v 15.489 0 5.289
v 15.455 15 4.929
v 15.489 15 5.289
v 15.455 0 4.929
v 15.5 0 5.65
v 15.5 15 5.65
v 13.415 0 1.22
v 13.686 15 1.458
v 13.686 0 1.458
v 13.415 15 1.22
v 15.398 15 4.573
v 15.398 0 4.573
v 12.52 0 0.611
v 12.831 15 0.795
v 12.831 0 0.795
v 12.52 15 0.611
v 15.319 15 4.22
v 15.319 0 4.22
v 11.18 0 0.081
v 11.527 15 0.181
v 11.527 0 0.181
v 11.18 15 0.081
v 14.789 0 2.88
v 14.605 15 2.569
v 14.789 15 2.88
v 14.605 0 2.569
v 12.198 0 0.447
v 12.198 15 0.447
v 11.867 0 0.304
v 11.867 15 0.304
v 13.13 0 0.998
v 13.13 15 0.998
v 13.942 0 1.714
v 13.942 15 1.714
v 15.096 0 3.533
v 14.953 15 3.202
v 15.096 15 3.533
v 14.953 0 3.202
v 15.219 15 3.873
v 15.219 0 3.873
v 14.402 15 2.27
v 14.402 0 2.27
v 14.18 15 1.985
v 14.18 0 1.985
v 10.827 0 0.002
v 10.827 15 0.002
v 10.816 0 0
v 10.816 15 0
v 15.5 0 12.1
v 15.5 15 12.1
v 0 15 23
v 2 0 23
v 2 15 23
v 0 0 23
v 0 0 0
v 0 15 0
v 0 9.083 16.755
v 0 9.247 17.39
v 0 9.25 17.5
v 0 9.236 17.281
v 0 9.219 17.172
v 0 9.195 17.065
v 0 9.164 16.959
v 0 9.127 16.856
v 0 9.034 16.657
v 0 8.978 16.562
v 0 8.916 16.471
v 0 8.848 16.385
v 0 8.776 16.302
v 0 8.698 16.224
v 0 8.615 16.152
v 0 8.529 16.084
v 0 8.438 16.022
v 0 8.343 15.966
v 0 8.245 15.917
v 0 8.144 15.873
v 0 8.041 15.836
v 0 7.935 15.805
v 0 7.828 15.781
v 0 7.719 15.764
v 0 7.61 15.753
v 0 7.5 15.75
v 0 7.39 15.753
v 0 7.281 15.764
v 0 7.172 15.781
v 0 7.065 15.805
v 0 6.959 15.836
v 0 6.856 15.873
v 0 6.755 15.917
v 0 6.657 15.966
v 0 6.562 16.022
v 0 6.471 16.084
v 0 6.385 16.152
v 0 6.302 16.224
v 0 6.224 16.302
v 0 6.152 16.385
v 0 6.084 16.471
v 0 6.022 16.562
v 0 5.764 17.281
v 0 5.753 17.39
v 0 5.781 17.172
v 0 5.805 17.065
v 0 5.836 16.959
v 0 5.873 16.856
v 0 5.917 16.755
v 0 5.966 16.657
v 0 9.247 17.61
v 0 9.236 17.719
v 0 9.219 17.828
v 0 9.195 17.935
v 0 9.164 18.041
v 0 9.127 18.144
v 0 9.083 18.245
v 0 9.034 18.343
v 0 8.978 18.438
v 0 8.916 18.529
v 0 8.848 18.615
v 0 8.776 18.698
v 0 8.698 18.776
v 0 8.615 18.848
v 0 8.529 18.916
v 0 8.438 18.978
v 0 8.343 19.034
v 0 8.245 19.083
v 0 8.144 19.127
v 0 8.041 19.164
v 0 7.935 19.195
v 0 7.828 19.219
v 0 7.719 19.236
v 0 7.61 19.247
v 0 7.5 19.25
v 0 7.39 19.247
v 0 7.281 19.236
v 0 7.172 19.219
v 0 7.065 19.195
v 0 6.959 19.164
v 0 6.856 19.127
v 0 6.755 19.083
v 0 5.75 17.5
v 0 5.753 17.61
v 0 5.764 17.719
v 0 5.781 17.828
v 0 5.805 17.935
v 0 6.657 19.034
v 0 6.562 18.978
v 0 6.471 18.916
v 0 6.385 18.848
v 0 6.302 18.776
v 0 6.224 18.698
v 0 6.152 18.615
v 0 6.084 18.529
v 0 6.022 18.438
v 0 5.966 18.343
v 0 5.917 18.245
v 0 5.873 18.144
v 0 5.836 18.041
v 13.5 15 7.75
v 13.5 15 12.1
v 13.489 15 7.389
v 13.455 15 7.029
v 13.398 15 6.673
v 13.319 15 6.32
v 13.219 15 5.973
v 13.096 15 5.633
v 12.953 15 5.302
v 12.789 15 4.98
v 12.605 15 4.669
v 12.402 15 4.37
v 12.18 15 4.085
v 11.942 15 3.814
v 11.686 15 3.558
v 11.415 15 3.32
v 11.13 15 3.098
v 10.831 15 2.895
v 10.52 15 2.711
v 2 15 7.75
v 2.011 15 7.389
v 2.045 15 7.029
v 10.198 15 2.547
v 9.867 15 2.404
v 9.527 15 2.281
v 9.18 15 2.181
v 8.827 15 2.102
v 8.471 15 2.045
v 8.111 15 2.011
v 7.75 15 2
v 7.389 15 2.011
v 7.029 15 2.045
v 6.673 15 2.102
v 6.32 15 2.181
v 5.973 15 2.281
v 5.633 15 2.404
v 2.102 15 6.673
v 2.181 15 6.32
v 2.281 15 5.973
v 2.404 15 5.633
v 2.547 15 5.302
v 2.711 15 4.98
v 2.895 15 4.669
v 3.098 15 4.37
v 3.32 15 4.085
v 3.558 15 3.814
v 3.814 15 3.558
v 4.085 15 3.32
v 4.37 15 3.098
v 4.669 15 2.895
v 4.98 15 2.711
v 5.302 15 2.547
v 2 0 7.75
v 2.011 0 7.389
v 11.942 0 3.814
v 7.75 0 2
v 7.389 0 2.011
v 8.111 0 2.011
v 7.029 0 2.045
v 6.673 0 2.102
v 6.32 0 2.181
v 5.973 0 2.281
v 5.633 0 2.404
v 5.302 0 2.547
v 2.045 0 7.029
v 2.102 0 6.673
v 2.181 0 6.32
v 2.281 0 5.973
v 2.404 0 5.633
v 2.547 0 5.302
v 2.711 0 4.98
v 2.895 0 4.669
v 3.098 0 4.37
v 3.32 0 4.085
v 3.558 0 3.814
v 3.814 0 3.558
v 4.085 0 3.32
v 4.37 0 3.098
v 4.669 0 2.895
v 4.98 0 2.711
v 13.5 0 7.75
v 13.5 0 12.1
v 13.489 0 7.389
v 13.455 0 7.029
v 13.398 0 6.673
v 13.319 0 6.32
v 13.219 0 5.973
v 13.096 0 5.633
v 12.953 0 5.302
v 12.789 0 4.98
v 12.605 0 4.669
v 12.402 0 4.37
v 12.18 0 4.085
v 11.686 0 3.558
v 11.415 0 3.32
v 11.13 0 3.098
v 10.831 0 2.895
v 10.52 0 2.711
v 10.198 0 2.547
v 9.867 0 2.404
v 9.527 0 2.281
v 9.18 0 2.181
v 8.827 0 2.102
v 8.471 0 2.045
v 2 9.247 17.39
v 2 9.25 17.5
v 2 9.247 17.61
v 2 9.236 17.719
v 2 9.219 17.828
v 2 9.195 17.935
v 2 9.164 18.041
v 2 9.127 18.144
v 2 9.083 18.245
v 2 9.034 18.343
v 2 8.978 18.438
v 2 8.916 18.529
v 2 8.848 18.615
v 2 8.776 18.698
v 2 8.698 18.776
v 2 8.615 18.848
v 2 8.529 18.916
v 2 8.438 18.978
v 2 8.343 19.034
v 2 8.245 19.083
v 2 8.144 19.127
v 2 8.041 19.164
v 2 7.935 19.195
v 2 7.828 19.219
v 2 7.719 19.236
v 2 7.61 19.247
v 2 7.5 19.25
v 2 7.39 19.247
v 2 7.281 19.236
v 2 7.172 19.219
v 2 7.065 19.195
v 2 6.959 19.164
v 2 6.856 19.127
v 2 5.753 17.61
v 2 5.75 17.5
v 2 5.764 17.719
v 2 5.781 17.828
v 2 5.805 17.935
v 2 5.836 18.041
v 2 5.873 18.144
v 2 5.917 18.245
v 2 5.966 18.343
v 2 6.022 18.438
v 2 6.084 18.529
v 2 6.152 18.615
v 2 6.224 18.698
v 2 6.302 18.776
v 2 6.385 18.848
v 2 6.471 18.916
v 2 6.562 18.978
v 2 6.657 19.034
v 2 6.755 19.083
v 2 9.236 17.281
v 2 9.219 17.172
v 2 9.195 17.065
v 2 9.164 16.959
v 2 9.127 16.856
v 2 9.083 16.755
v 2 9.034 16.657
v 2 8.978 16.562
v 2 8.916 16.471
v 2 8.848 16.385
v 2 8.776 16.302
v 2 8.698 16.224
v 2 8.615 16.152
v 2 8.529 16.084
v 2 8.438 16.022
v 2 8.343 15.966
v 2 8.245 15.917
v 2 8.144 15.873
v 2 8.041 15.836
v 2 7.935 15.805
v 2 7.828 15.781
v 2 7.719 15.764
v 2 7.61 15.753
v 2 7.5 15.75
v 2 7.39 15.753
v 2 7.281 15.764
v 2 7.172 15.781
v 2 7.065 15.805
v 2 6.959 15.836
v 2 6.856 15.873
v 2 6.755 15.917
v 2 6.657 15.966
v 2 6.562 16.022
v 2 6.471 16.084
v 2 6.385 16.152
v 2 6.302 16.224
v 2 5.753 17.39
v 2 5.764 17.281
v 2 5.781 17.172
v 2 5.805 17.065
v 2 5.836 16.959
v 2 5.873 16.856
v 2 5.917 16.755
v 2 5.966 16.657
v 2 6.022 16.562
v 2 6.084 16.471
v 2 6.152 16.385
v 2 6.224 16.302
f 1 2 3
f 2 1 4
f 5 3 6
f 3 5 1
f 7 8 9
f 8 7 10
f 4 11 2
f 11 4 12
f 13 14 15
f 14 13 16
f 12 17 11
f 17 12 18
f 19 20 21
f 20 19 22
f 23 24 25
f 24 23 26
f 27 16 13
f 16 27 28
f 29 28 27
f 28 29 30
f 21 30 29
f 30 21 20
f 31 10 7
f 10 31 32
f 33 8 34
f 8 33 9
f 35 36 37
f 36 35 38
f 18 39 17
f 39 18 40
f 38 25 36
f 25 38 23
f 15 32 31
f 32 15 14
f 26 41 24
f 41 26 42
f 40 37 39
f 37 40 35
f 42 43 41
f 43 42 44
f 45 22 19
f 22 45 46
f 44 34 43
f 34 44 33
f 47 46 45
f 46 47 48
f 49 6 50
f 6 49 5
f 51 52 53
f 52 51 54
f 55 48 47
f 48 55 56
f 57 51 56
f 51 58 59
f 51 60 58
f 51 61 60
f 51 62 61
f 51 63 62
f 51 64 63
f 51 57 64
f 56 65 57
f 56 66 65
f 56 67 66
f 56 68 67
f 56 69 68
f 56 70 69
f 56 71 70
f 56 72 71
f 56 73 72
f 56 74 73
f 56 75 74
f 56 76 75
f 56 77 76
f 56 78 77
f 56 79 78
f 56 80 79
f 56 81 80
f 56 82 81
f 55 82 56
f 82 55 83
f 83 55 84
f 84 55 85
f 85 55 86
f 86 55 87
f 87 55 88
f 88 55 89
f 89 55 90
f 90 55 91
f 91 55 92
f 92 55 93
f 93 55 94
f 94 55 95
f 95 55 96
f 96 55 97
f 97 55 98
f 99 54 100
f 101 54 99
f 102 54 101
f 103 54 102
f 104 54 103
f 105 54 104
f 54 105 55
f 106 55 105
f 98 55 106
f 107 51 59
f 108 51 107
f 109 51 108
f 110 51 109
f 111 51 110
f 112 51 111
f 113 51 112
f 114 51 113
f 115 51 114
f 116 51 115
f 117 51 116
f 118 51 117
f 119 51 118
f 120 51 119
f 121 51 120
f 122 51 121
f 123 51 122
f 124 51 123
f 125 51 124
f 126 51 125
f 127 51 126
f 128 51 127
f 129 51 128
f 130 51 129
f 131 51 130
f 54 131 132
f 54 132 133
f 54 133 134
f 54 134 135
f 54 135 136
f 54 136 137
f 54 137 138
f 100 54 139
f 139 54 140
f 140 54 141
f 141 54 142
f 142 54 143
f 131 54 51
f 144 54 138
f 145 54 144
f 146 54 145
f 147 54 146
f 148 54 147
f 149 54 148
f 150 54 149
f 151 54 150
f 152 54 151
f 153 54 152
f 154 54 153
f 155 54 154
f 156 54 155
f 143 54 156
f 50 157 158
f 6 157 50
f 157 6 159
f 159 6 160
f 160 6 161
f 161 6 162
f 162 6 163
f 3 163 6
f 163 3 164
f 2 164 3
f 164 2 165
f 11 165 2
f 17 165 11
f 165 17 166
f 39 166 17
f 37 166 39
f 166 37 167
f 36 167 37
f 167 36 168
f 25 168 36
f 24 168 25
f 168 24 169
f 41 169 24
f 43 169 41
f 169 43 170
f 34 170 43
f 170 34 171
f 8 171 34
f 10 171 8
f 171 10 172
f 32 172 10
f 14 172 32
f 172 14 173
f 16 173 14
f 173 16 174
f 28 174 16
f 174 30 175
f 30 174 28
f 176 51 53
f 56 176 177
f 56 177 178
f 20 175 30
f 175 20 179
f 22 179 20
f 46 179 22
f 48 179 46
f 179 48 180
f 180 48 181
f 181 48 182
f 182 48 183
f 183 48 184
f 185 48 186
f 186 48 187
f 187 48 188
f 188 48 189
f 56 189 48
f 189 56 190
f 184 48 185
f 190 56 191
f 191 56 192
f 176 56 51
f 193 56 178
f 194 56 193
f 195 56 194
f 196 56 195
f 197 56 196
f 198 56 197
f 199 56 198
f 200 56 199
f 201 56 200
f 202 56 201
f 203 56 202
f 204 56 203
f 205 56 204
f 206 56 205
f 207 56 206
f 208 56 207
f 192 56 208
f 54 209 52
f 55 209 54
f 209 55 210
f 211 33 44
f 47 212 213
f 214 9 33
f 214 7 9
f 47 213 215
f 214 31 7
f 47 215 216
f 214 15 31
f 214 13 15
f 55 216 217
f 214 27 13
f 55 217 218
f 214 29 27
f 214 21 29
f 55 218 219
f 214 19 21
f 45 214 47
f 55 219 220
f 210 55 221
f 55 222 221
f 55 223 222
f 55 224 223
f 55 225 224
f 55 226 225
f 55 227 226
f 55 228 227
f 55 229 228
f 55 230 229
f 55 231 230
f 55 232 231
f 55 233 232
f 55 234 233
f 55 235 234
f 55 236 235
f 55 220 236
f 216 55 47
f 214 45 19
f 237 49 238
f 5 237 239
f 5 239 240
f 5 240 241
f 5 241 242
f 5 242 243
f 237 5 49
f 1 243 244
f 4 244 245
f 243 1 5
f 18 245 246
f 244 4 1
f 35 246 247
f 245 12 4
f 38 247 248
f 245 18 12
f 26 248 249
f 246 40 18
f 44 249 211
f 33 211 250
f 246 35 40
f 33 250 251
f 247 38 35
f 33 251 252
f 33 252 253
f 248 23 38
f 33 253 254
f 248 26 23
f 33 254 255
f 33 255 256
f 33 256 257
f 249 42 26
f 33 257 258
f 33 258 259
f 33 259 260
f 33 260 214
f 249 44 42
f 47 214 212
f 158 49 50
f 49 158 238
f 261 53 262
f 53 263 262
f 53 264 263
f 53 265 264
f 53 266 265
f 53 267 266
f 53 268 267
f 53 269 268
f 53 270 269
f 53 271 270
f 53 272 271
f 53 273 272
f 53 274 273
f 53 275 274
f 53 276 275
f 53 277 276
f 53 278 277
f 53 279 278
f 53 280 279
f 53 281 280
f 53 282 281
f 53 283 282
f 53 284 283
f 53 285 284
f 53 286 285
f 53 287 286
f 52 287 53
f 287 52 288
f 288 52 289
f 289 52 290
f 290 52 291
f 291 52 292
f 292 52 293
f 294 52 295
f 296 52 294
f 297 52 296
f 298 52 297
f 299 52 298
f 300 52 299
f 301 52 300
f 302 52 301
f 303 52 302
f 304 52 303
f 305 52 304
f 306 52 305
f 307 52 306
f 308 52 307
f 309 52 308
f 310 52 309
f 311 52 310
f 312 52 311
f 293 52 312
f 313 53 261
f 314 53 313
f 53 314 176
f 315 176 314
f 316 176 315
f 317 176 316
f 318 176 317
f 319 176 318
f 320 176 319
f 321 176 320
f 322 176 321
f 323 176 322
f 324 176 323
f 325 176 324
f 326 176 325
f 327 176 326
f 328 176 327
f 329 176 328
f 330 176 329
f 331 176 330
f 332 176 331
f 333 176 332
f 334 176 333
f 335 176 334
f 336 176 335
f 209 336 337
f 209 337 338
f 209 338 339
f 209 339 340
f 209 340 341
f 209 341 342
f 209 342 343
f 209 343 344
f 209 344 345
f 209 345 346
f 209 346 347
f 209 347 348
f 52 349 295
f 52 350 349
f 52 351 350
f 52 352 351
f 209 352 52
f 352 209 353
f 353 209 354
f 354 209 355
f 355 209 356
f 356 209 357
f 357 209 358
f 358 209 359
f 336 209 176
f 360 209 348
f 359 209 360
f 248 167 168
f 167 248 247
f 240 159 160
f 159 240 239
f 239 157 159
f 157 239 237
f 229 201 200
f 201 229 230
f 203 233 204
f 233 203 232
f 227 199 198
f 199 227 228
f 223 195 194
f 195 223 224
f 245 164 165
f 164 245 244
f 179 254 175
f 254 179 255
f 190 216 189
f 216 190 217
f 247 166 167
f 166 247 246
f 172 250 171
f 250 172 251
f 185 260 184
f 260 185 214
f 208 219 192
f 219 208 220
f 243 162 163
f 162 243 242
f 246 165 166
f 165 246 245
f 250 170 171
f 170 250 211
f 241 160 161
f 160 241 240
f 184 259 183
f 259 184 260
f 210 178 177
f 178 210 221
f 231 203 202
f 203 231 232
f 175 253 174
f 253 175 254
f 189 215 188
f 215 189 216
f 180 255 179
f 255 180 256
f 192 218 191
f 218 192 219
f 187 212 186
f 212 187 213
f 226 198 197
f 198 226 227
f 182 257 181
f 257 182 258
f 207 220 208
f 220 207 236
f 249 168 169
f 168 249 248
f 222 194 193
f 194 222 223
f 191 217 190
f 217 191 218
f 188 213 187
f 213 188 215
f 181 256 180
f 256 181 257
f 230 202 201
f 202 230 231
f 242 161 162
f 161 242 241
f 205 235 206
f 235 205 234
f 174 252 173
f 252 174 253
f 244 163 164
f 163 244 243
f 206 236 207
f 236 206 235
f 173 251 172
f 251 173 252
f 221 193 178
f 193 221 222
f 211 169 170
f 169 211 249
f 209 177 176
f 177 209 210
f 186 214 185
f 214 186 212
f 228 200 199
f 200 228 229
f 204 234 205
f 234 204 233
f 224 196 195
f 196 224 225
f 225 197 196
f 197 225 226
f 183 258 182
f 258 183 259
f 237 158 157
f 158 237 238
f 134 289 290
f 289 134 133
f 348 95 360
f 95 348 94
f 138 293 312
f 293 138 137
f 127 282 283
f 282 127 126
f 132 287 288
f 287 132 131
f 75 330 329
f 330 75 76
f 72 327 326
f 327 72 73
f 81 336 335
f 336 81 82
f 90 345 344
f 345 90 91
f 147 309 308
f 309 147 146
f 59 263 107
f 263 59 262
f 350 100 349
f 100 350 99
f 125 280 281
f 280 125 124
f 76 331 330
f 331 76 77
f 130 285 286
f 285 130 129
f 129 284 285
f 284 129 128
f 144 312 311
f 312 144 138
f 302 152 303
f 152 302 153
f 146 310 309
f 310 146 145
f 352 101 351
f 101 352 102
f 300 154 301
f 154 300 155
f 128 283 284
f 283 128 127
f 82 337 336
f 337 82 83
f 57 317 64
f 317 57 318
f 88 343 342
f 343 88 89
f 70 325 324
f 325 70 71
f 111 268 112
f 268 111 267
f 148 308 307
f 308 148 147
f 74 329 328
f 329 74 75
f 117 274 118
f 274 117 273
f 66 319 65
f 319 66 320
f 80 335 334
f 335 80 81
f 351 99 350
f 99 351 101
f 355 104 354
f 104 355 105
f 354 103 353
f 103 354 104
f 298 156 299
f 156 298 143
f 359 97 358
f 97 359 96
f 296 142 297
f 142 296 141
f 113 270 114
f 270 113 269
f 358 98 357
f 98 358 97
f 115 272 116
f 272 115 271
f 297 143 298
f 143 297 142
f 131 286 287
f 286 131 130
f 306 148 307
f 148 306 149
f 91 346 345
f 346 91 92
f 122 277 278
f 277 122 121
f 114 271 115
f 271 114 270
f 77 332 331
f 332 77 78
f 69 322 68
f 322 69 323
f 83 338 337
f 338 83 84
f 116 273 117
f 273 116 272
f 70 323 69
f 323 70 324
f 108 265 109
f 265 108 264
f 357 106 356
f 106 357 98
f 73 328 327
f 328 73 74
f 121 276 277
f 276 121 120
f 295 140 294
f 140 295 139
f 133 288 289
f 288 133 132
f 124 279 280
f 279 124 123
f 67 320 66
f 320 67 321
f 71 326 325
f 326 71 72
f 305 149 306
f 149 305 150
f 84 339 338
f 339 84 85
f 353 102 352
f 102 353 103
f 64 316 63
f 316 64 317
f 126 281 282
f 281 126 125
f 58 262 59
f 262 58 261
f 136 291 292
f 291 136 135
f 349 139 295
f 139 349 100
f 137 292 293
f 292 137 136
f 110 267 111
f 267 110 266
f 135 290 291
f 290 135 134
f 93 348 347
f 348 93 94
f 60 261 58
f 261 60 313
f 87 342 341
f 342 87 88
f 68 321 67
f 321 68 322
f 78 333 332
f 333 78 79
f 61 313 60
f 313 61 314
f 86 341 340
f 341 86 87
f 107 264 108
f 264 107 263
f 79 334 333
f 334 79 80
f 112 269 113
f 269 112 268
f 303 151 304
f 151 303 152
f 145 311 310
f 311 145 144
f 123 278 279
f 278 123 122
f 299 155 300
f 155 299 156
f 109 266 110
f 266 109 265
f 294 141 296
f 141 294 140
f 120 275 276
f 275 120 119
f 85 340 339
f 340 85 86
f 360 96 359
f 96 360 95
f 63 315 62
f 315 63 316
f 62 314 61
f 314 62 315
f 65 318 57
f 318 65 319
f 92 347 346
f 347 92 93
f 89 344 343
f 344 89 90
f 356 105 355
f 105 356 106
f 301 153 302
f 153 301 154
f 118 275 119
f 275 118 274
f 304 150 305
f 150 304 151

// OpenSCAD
/*
 * file: prusa-i3-tool-holder.scad
 * author: gregor binder <gregor_reprap@catrix.at>
 * date: 9.2.2014
 * last change: 9.2.2014
 * license: CC BY-NC-SA 4.0
 */

hole_d=3.5;
thickness=2;
length1=12;
length2=23;
ligther_thickness=11.5;
hole_distance=2;
width=15;
curve_radius=ligther_thickness/2;
$fn=100;

difference() {
	cube([thickness+thickness+ligther_thickness,width,length2]);
	translate([thickness,-0.1,length1+0.1])
		cube([thickness+thickness+ligther_thickness,width+5,length2-length1+5]);
	translate([(thickness+thickness+ligther_thickness)/2,-0.1,(thickness+thickness+ligther_thickness)/2])
		rotate([-90,0,0])
			cylinder(h=width+5,r=ligther_thickness/2);
	translate([thickness,-0.1,(thickness+thickness+ligther_thickness)/2])
		cube([ligther_thickness,width+5,length1]);
	translate([thickness+thickness+ligther_thickness-curve_radius,-0.1,-0.1]) {
		difference(){
			cube([curve_radius+5,width+5,curve_radius]);
			translate([0,-0.1,curve_radius])
				rotate([-90,0,0])
				cylinder(h=width+10,r=curve_radius);
		}
	}
	translate([-0.1,width/2,length2-hole_d-hole_distance])
		rotate([0,90,0])
			cylinder(h=thickness+5,r=hole_d/2);
}
